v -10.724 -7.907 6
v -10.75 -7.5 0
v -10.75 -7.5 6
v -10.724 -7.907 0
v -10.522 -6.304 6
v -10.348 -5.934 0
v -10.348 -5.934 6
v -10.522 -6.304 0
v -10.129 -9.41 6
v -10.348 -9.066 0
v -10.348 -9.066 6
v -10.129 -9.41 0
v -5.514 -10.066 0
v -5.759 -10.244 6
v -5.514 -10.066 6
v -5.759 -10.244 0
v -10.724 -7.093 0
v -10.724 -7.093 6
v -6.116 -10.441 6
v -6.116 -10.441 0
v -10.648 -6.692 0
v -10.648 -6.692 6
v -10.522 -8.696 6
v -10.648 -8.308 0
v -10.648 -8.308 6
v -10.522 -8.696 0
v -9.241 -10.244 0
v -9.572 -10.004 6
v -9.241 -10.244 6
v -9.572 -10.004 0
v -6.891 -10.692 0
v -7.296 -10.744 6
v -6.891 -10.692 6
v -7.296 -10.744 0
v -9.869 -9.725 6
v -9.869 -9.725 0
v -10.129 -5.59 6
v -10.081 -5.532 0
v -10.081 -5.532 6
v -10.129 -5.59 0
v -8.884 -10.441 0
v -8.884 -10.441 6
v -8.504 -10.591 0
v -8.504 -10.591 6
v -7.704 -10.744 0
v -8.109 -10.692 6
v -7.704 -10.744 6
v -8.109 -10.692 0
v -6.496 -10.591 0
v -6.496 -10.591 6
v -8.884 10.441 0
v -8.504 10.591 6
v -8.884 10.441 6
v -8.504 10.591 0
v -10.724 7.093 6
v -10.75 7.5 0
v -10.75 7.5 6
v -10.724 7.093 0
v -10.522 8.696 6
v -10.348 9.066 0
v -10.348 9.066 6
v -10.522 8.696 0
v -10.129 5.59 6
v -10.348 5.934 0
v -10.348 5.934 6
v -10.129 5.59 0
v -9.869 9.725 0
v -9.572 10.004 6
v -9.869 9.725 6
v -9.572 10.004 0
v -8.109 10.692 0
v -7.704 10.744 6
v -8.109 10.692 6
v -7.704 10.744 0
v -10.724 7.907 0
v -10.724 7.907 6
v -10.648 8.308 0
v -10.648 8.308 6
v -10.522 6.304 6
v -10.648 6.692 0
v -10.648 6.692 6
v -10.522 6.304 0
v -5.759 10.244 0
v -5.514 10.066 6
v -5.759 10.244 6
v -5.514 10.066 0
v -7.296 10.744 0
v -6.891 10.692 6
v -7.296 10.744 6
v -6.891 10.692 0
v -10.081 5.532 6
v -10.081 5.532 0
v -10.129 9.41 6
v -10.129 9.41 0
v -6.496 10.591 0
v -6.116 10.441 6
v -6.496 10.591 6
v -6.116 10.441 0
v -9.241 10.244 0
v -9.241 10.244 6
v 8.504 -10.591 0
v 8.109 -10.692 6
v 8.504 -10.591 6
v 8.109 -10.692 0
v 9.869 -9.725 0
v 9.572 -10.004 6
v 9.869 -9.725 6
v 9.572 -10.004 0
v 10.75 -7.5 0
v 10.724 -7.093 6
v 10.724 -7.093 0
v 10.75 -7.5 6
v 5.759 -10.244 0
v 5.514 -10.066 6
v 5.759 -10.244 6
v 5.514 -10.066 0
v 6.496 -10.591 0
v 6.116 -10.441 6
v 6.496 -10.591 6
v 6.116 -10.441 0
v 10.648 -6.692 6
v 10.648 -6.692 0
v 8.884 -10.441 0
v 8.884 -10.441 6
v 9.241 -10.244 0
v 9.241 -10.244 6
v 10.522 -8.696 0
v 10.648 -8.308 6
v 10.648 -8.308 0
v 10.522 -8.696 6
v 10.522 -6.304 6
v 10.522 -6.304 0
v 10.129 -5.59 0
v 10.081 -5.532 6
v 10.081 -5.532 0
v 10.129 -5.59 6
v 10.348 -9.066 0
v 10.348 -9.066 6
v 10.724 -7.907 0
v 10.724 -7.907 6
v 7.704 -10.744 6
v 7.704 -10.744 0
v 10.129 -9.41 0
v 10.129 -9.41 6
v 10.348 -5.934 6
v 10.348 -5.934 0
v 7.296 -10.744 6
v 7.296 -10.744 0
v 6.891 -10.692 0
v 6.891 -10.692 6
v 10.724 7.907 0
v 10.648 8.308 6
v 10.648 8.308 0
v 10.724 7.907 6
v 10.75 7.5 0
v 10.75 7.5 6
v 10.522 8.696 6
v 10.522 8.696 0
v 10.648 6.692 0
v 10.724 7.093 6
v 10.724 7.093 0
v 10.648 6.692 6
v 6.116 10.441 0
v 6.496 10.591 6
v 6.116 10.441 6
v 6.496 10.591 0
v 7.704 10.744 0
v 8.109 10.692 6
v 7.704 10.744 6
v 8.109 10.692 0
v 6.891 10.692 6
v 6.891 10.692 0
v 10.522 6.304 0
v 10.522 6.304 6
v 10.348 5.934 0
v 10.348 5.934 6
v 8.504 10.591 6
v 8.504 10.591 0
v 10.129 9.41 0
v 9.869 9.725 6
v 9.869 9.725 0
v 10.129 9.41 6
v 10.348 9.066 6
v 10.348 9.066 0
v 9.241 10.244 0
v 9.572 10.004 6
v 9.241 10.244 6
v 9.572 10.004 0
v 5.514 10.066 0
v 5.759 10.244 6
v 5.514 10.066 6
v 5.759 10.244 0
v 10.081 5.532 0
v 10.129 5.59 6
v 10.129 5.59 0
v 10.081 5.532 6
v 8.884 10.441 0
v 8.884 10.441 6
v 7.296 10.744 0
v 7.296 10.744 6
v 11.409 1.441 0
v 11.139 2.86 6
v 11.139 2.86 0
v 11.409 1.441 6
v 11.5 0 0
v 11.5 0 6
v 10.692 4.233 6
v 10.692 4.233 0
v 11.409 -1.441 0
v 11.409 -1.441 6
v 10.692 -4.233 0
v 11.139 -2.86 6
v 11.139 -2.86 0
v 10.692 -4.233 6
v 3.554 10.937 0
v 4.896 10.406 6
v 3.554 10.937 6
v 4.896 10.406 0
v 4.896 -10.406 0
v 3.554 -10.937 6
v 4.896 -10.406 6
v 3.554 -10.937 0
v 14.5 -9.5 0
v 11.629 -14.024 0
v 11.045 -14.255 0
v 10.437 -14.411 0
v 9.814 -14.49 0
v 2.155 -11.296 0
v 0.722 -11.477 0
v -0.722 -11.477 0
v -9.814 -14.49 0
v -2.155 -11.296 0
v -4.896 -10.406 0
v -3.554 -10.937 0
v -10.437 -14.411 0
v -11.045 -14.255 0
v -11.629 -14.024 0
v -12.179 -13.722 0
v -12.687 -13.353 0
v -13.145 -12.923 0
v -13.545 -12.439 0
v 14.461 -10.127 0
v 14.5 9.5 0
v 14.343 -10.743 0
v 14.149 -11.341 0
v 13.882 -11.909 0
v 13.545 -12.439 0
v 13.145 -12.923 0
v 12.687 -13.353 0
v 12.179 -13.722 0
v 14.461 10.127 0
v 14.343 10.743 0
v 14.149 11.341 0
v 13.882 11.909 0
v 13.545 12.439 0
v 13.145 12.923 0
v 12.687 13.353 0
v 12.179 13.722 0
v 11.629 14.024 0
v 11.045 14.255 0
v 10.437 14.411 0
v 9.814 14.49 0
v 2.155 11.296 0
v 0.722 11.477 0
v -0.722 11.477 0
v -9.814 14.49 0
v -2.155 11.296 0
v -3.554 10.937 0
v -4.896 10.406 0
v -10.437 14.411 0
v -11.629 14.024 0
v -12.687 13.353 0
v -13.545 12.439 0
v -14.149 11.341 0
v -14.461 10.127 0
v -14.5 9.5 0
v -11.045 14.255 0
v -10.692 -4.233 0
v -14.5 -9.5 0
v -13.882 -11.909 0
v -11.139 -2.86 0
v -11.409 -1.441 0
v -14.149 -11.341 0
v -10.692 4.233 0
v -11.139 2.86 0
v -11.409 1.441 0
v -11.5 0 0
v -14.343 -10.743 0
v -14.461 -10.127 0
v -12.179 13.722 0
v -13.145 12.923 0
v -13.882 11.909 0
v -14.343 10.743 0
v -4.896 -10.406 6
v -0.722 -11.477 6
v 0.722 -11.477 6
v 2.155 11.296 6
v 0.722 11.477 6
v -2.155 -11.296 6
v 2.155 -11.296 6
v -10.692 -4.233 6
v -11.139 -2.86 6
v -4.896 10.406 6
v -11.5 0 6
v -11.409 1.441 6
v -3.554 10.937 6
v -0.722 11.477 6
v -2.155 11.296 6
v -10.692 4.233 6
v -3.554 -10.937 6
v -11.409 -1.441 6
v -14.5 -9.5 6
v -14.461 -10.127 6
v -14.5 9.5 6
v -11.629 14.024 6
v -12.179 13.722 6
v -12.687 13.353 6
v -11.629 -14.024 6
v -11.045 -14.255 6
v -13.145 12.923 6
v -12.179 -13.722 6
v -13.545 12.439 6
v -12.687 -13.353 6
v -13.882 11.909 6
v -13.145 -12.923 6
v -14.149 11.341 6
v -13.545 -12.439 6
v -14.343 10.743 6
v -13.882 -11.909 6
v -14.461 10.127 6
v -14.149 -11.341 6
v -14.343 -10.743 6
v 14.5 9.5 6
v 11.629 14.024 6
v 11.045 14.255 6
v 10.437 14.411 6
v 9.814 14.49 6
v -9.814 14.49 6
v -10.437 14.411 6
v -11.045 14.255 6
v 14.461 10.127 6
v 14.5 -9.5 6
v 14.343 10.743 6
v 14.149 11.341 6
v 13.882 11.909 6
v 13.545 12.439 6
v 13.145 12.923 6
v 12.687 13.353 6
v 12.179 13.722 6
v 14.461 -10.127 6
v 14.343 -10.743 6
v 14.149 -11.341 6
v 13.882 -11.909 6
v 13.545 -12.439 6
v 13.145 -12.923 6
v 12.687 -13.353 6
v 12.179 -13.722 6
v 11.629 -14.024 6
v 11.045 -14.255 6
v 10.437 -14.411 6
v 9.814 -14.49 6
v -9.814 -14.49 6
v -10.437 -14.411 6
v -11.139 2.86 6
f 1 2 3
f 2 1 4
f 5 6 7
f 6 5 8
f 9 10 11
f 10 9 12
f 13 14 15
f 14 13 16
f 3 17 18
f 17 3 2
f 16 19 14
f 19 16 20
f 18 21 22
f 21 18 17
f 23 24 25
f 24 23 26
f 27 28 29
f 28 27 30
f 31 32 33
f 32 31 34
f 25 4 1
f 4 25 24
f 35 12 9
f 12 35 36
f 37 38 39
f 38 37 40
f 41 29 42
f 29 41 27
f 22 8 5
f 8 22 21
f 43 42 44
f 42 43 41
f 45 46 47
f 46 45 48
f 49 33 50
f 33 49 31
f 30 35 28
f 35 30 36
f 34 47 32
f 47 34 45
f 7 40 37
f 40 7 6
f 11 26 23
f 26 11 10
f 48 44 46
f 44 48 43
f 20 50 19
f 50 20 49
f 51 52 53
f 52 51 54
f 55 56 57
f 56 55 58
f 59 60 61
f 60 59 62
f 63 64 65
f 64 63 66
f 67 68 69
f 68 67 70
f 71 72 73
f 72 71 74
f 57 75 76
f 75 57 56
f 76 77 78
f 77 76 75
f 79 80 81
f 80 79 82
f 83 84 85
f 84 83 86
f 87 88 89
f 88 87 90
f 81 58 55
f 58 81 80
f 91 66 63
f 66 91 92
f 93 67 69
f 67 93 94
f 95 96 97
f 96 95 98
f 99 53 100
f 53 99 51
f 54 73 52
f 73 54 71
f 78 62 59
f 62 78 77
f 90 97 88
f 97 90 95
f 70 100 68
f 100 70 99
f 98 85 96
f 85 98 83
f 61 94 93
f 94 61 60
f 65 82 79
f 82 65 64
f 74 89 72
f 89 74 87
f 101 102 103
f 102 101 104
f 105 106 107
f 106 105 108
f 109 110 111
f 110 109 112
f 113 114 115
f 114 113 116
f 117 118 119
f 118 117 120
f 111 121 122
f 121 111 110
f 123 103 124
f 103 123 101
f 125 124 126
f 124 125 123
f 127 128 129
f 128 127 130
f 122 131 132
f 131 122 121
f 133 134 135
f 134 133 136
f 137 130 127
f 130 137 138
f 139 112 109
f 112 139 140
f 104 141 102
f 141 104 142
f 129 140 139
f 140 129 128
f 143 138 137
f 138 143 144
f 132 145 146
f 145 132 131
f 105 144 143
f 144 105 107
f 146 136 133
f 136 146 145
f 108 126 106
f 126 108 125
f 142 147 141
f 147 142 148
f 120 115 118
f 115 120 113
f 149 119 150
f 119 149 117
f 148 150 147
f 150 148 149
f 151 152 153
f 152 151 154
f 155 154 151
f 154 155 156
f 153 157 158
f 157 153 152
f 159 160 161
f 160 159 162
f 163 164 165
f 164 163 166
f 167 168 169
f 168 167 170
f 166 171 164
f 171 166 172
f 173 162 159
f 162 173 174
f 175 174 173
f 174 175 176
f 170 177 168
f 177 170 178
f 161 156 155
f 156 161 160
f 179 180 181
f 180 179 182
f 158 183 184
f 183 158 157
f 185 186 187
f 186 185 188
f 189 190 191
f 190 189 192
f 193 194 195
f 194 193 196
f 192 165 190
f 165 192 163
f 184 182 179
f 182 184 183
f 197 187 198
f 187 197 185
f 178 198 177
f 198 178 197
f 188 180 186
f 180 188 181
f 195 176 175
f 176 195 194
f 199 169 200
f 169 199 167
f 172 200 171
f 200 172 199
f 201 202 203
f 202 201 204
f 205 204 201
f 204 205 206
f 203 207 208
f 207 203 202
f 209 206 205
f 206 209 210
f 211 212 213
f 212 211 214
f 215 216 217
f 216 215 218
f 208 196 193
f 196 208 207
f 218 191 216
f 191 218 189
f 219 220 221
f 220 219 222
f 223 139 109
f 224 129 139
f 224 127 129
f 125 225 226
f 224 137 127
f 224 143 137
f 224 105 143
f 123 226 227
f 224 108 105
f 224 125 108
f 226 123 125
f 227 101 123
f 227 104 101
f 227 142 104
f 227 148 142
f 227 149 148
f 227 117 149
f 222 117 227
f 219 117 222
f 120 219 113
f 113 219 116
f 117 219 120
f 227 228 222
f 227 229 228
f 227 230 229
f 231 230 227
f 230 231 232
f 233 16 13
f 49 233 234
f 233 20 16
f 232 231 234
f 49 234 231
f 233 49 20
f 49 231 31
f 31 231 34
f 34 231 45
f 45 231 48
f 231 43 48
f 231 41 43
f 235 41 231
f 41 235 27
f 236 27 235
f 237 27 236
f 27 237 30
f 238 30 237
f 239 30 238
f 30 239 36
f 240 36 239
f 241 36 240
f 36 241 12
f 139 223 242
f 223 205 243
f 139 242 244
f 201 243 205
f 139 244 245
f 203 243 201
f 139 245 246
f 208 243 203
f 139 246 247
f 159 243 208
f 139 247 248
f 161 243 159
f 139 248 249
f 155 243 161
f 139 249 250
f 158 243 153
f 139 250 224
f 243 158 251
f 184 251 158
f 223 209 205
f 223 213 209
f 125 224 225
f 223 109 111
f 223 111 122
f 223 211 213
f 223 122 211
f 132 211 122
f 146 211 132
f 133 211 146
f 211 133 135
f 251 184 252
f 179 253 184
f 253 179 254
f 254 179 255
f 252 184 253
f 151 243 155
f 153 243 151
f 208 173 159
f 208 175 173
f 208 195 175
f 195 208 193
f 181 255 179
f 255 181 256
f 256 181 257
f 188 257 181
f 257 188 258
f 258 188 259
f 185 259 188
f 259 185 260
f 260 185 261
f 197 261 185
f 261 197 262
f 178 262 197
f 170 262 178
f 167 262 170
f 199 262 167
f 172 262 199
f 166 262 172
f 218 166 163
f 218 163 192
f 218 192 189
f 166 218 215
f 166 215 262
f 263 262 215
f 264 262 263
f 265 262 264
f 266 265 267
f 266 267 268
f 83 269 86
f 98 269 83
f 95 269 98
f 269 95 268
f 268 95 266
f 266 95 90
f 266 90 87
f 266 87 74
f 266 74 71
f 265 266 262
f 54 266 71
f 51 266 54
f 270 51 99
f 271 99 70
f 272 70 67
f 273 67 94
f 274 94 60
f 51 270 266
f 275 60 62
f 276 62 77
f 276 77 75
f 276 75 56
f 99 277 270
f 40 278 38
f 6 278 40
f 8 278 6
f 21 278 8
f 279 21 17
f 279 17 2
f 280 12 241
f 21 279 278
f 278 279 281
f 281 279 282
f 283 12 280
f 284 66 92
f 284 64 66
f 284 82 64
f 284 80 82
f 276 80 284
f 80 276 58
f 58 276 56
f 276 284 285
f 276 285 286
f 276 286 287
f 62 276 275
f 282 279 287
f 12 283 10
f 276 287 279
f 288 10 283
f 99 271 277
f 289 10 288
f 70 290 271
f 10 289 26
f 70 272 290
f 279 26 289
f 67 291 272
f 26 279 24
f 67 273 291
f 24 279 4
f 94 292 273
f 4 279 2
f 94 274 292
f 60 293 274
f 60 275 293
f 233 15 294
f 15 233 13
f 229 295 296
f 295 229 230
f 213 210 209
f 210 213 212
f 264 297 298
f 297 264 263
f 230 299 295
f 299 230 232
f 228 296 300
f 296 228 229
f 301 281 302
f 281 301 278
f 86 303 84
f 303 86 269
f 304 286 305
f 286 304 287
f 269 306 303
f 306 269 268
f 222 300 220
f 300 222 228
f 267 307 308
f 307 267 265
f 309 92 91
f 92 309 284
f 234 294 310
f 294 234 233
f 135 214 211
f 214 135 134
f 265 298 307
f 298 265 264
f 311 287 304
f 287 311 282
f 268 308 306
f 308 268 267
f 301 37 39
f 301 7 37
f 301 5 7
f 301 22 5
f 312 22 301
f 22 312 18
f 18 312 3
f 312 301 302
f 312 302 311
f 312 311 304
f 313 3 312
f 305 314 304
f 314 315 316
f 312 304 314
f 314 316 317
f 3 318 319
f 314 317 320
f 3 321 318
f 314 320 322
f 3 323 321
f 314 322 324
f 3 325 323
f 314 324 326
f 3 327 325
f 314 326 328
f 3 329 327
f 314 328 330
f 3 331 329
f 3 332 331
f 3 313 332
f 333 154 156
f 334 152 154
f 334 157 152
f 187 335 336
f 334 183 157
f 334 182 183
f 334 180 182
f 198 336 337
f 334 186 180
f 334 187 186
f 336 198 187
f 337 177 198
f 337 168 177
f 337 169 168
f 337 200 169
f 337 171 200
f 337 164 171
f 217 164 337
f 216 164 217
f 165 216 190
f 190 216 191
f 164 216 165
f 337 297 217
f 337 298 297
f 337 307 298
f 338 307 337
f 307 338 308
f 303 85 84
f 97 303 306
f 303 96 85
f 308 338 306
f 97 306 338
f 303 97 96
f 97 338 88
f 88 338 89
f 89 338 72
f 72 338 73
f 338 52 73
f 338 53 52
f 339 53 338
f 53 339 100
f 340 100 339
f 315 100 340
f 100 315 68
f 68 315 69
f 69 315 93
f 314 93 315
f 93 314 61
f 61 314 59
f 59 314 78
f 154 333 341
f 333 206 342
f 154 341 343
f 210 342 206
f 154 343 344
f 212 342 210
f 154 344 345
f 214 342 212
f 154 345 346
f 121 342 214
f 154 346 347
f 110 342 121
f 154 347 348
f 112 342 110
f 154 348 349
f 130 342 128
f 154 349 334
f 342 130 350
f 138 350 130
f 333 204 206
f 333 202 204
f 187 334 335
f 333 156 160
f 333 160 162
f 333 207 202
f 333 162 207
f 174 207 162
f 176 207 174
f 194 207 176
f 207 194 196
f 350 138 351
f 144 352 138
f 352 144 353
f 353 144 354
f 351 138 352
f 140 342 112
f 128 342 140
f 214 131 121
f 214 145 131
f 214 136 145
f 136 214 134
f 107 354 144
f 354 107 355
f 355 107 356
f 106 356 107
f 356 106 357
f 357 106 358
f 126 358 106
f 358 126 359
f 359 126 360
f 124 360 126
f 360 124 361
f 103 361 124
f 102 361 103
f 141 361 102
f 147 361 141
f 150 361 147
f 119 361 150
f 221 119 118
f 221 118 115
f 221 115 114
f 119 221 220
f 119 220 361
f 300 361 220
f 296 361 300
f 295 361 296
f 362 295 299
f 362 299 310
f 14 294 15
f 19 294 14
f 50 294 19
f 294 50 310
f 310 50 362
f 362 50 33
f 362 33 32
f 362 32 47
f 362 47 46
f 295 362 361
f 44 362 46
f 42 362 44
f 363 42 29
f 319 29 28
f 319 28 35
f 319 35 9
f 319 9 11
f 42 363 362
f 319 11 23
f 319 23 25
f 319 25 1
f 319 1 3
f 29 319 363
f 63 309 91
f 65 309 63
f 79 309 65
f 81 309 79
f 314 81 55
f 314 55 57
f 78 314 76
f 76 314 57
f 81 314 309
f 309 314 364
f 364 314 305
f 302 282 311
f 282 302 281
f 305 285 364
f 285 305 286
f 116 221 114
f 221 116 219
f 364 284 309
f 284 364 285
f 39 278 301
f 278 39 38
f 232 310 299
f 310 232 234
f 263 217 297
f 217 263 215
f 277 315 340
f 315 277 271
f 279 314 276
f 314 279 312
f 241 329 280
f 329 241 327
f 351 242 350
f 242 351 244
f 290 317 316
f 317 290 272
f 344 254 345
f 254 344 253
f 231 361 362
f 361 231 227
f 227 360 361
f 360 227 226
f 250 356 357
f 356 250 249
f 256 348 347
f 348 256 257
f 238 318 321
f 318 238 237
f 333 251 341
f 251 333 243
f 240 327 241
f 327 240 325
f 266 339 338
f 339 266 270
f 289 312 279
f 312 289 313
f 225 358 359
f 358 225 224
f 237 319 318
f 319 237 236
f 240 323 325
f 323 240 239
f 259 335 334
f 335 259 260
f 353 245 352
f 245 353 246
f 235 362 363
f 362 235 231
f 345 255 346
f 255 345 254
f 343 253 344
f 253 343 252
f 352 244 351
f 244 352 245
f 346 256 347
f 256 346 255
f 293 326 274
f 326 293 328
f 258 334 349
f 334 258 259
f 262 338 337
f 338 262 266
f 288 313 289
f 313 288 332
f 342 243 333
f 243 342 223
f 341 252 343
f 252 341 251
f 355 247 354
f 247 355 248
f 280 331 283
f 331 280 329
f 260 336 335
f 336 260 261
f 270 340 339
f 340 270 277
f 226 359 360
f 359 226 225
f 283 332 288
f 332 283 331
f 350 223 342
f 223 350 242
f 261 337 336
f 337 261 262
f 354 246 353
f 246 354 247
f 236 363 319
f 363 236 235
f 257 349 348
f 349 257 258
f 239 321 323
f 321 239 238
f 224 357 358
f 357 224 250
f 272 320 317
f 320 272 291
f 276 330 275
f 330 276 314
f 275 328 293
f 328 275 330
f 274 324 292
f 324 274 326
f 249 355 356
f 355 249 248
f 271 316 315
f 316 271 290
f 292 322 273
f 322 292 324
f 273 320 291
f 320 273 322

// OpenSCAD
$fn = 50;

difference() {
	union() {
		hull() {
			translate(v = [-9.5, 9.5, 0]) {
				cylinder(h = 6, r = 5);
			}
			translate(v = [9.5, 9.5, 0]) {
				cylinder(h = 6, r = 5);
			}
			translate(v = [-9.5, -9.5, 0]) {
				cylinder(h = 6, r = 5);
			}
			translate(v = [9.5, -9.5, 0]) {
				cylinder(h = 6, r = 5);
			}
		}
	}
	union() {
		translate(v = [-7.5, -7.5, -100.0]) {
			cylinder(h = 200, r = 3.25);
		}
		translate(v = [-7.5, 7.5, -100.0]) {
			cylinder(h = 200, r = 3.25);
		}
		translate(v = [7.5, -7.5, -100.0]) {
			cylinder(h = 200, r = 3.25);
		}
		translate(v = [7.5, 7.5, -100.0]) {
			cylinder(h = 200, r = 3.25);
		}
		translate(v = [-7.5, -7.5, -100.0]) {
			cylinder(h = 200, r = 1.8);
		}
		translate(v = [-7.5, 7.5, -100.0]) {
			cylinder(h = 200, r = 1.8);
		}
		translate(v = [7.5, -7.5, -100.0]) {
			cylinder(h = 200, r = 1.8);
		}
		translate(v = [7.5, 7.5, -100.0]) {
			cylinder(h = 200, r = 1.8);
		}
		cylinder(h = 6, r = 11.5);
	}
}
